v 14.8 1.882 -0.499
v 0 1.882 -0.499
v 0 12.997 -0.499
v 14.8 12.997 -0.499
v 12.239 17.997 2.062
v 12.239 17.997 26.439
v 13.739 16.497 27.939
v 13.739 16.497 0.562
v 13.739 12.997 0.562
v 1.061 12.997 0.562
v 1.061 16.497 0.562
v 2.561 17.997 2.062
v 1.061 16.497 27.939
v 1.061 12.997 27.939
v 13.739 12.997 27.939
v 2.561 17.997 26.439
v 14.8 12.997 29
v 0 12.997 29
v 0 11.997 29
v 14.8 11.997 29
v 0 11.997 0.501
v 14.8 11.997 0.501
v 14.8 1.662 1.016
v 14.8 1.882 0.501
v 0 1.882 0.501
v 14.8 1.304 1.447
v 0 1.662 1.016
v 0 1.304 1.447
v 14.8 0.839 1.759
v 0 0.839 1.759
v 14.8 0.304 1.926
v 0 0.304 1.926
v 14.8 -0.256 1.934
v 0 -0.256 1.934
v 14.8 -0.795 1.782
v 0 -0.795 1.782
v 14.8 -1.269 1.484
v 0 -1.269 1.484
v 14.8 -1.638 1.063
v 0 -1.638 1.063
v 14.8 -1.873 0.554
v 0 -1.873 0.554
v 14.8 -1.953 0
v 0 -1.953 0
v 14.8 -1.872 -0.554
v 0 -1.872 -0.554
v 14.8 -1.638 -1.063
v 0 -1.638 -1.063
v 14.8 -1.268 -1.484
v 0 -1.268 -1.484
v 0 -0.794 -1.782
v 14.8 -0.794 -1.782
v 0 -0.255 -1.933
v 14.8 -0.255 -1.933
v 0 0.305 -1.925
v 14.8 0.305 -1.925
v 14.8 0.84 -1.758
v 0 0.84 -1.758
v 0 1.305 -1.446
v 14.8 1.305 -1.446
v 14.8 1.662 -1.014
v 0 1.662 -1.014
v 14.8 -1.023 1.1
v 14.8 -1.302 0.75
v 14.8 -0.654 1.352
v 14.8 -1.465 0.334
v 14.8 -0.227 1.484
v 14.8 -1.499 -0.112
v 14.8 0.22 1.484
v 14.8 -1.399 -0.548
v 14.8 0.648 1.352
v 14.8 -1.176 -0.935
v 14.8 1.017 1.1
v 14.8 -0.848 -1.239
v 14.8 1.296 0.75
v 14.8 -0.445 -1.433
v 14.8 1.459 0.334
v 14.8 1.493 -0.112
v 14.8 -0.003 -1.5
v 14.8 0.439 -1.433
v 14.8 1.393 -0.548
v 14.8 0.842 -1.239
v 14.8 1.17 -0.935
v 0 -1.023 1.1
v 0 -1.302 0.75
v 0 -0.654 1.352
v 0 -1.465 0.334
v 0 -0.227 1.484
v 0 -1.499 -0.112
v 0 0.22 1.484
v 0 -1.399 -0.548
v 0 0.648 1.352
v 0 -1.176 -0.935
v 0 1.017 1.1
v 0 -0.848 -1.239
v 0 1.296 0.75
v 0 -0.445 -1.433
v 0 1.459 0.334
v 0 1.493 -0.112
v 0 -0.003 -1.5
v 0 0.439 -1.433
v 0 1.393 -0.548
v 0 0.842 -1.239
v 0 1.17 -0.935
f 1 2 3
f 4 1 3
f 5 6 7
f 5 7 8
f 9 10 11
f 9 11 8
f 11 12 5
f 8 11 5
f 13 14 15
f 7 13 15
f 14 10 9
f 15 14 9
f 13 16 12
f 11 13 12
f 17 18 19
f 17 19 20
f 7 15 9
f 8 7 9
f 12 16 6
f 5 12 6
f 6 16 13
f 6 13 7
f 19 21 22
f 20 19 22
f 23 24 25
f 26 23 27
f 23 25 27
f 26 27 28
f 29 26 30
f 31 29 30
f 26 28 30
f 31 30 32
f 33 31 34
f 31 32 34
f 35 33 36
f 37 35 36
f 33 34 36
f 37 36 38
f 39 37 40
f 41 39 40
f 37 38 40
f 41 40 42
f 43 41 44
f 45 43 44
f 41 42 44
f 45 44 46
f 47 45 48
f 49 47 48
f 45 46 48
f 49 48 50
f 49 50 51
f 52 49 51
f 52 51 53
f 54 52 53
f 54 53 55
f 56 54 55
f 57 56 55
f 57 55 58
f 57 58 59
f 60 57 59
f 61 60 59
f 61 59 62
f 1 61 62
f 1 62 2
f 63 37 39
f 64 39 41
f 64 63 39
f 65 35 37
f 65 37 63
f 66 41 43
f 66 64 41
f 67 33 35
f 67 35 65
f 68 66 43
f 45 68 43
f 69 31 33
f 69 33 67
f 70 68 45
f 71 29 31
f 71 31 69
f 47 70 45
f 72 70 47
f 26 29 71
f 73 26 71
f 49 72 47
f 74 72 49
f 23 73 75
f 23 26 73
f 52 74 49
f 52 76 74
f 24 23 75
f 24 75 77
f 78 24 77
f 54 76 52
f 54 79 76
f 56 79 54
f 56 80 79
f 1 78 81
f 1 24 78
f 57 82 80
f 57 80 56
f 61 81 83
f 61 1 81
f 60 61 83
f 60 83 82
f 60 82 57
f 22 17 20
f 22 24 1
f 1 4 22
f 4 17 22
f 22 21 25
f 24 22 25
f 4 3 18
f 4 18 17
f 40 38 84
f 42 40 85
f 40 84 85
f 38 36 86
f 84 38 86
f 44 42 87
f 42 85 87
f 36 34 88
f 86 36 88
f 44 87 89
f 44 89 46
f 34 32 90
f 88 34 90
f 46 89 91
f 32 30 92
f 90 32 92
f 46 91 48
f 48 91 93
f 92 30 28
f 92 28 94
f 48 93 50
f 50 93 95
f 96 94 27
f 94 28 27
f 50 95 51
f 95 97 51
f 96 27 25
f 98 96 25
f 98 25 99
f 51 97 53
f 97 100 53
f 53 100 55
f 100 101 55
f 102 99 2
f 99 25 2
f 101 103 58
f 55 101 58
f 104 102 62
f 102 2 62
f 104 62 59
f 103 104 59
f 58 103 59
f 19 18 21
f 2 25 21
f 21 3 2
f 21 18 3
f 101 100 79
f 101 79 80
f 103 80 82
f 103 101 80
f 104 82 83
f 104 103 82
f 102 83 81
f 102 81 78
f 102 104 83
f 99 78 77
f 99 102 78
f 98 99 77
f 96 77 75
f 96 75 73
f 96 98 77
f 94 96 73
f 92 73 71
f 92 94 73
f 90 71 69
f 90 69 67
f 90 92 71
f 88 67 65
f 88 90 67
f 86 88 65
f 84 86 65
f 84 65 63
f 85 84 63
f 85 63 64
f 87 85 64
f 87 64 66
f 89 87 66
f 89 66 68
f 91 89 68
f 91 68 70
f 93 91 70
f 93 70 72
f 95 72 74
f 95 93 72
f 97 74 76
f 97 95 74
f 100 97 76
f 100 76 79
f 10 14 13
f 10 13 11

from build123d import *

# Parameters (mm, degrees)
BOSS_EXTRUDE1_DEPTH = 14.8
SKETCH4_W           = 14.8
SKETCH4_H           = 28.498993342
BOSS_EXTRUDE2_DEPTH = 1
SKETCH5_W           = 12.678679656
SKETCH5_H           = 27.377672998
BOSS_EXTRUDE3_DEPTH = 5
CHAMFER1_SIZE       = 1.5


with BuildPart() as part:
    # Sketch1 → Boss-Extrude1 (new body)
    with BuildSketch(Plane(origin=(0, 0, 0), x_dir=(0, 0, -1), z_dir=(1, 0, 0))):
        with BuildLine():
            Line((0.498993342, 12.996913423), (-0.000472168, 12.996913423))
            Line((-0.000472168, 12.996913423), (-0.501006658, 12.996913423))
            Line((-0.501006658, 12.996913423), (-0.501006658, 1.881579236))
            ThreePointArc((-0.501006658, 1.881579236), (8.0809e-05, -1.953086498), (0.498993342, 1.881862814))
            Line((0.498993342, 1.881862814), (0.498993342, 12.996913423))
        make_face()
        with BuildLine():
            ThreePointArc((-0.000472168, 1.496913423), (1.060188004, 1.057573595), (1.499527832, -0.003086577))
            ThreePointArc((1.499527832, -0.003086577), (-1.06113234, -1.063746748), (-0.000472168, 1.496913423))
        make_face(mode=Mode.SUBTRACT)
    extrude(amount=BOSS_EXTRUDE1_DEPTH)

    # Sketch4 → Boss-Extrude2 (add)
    with BuildSketch(Plane(origin=(0, 12.996913423, 0), x_dir=(1, 0, 0), z_dir=(0, 1, 0))):
        with Locations((7.4, -14.750503329)):
            Rectangle(SKETCH4_W, SKETCH4_H)
    extrude(amount=-BOSS_EXTRUDE2_DEPTH)

    # Sketch5 → Boss-Extrude3 (add)
    with BuildSketch(Plane(origin=(0, 12.996913423, 0), x_dir=(1, 0, 0), z_dir=(0, 1, 0))):
        with Locations((7.4, -14.250503329)):
            Rectangle(SKETCH5_W, SKETCH5_H)
    extrude(amount=BOSS_EXTRUDE3_DEPTH)

    # Chamfer1
    chamfer1_edges = [part.edges().sort_by_distance(p)[0] for p in [
        (7.4, 17.996913423, 27.939339828),
        (1.060660172, 17.996913423, 14.250503329),
        (7.4, 17.996913423, 0.56166683),
        (13.739339828, 17.996913423, 14.250503329),
    ]]
    chamfer(chamfer1_edges, length=CHAMFER1_SIZE)


with BuildPart() as body_2:
    # Split1: the piece on the far side of the plane
    add(part.part)
    split(bisect_by=Plane(origin=(14.8, 12.996913423, 0), x_dir=(0, 0, 1), z_dir=(0, 1, 0)), keep=Keep.BOTTOM)


with BuildPart() as part_1:
    add(part.part)

    # Split1
    split(bisect_by=Plane(origin=(14.8, 12.996913423, 0), x_dir=(0, 0, 1), z_dir=(0, 1, 0)), keep=Keep.TOP)


solid = Compound([body_2.part, part_1.part])
